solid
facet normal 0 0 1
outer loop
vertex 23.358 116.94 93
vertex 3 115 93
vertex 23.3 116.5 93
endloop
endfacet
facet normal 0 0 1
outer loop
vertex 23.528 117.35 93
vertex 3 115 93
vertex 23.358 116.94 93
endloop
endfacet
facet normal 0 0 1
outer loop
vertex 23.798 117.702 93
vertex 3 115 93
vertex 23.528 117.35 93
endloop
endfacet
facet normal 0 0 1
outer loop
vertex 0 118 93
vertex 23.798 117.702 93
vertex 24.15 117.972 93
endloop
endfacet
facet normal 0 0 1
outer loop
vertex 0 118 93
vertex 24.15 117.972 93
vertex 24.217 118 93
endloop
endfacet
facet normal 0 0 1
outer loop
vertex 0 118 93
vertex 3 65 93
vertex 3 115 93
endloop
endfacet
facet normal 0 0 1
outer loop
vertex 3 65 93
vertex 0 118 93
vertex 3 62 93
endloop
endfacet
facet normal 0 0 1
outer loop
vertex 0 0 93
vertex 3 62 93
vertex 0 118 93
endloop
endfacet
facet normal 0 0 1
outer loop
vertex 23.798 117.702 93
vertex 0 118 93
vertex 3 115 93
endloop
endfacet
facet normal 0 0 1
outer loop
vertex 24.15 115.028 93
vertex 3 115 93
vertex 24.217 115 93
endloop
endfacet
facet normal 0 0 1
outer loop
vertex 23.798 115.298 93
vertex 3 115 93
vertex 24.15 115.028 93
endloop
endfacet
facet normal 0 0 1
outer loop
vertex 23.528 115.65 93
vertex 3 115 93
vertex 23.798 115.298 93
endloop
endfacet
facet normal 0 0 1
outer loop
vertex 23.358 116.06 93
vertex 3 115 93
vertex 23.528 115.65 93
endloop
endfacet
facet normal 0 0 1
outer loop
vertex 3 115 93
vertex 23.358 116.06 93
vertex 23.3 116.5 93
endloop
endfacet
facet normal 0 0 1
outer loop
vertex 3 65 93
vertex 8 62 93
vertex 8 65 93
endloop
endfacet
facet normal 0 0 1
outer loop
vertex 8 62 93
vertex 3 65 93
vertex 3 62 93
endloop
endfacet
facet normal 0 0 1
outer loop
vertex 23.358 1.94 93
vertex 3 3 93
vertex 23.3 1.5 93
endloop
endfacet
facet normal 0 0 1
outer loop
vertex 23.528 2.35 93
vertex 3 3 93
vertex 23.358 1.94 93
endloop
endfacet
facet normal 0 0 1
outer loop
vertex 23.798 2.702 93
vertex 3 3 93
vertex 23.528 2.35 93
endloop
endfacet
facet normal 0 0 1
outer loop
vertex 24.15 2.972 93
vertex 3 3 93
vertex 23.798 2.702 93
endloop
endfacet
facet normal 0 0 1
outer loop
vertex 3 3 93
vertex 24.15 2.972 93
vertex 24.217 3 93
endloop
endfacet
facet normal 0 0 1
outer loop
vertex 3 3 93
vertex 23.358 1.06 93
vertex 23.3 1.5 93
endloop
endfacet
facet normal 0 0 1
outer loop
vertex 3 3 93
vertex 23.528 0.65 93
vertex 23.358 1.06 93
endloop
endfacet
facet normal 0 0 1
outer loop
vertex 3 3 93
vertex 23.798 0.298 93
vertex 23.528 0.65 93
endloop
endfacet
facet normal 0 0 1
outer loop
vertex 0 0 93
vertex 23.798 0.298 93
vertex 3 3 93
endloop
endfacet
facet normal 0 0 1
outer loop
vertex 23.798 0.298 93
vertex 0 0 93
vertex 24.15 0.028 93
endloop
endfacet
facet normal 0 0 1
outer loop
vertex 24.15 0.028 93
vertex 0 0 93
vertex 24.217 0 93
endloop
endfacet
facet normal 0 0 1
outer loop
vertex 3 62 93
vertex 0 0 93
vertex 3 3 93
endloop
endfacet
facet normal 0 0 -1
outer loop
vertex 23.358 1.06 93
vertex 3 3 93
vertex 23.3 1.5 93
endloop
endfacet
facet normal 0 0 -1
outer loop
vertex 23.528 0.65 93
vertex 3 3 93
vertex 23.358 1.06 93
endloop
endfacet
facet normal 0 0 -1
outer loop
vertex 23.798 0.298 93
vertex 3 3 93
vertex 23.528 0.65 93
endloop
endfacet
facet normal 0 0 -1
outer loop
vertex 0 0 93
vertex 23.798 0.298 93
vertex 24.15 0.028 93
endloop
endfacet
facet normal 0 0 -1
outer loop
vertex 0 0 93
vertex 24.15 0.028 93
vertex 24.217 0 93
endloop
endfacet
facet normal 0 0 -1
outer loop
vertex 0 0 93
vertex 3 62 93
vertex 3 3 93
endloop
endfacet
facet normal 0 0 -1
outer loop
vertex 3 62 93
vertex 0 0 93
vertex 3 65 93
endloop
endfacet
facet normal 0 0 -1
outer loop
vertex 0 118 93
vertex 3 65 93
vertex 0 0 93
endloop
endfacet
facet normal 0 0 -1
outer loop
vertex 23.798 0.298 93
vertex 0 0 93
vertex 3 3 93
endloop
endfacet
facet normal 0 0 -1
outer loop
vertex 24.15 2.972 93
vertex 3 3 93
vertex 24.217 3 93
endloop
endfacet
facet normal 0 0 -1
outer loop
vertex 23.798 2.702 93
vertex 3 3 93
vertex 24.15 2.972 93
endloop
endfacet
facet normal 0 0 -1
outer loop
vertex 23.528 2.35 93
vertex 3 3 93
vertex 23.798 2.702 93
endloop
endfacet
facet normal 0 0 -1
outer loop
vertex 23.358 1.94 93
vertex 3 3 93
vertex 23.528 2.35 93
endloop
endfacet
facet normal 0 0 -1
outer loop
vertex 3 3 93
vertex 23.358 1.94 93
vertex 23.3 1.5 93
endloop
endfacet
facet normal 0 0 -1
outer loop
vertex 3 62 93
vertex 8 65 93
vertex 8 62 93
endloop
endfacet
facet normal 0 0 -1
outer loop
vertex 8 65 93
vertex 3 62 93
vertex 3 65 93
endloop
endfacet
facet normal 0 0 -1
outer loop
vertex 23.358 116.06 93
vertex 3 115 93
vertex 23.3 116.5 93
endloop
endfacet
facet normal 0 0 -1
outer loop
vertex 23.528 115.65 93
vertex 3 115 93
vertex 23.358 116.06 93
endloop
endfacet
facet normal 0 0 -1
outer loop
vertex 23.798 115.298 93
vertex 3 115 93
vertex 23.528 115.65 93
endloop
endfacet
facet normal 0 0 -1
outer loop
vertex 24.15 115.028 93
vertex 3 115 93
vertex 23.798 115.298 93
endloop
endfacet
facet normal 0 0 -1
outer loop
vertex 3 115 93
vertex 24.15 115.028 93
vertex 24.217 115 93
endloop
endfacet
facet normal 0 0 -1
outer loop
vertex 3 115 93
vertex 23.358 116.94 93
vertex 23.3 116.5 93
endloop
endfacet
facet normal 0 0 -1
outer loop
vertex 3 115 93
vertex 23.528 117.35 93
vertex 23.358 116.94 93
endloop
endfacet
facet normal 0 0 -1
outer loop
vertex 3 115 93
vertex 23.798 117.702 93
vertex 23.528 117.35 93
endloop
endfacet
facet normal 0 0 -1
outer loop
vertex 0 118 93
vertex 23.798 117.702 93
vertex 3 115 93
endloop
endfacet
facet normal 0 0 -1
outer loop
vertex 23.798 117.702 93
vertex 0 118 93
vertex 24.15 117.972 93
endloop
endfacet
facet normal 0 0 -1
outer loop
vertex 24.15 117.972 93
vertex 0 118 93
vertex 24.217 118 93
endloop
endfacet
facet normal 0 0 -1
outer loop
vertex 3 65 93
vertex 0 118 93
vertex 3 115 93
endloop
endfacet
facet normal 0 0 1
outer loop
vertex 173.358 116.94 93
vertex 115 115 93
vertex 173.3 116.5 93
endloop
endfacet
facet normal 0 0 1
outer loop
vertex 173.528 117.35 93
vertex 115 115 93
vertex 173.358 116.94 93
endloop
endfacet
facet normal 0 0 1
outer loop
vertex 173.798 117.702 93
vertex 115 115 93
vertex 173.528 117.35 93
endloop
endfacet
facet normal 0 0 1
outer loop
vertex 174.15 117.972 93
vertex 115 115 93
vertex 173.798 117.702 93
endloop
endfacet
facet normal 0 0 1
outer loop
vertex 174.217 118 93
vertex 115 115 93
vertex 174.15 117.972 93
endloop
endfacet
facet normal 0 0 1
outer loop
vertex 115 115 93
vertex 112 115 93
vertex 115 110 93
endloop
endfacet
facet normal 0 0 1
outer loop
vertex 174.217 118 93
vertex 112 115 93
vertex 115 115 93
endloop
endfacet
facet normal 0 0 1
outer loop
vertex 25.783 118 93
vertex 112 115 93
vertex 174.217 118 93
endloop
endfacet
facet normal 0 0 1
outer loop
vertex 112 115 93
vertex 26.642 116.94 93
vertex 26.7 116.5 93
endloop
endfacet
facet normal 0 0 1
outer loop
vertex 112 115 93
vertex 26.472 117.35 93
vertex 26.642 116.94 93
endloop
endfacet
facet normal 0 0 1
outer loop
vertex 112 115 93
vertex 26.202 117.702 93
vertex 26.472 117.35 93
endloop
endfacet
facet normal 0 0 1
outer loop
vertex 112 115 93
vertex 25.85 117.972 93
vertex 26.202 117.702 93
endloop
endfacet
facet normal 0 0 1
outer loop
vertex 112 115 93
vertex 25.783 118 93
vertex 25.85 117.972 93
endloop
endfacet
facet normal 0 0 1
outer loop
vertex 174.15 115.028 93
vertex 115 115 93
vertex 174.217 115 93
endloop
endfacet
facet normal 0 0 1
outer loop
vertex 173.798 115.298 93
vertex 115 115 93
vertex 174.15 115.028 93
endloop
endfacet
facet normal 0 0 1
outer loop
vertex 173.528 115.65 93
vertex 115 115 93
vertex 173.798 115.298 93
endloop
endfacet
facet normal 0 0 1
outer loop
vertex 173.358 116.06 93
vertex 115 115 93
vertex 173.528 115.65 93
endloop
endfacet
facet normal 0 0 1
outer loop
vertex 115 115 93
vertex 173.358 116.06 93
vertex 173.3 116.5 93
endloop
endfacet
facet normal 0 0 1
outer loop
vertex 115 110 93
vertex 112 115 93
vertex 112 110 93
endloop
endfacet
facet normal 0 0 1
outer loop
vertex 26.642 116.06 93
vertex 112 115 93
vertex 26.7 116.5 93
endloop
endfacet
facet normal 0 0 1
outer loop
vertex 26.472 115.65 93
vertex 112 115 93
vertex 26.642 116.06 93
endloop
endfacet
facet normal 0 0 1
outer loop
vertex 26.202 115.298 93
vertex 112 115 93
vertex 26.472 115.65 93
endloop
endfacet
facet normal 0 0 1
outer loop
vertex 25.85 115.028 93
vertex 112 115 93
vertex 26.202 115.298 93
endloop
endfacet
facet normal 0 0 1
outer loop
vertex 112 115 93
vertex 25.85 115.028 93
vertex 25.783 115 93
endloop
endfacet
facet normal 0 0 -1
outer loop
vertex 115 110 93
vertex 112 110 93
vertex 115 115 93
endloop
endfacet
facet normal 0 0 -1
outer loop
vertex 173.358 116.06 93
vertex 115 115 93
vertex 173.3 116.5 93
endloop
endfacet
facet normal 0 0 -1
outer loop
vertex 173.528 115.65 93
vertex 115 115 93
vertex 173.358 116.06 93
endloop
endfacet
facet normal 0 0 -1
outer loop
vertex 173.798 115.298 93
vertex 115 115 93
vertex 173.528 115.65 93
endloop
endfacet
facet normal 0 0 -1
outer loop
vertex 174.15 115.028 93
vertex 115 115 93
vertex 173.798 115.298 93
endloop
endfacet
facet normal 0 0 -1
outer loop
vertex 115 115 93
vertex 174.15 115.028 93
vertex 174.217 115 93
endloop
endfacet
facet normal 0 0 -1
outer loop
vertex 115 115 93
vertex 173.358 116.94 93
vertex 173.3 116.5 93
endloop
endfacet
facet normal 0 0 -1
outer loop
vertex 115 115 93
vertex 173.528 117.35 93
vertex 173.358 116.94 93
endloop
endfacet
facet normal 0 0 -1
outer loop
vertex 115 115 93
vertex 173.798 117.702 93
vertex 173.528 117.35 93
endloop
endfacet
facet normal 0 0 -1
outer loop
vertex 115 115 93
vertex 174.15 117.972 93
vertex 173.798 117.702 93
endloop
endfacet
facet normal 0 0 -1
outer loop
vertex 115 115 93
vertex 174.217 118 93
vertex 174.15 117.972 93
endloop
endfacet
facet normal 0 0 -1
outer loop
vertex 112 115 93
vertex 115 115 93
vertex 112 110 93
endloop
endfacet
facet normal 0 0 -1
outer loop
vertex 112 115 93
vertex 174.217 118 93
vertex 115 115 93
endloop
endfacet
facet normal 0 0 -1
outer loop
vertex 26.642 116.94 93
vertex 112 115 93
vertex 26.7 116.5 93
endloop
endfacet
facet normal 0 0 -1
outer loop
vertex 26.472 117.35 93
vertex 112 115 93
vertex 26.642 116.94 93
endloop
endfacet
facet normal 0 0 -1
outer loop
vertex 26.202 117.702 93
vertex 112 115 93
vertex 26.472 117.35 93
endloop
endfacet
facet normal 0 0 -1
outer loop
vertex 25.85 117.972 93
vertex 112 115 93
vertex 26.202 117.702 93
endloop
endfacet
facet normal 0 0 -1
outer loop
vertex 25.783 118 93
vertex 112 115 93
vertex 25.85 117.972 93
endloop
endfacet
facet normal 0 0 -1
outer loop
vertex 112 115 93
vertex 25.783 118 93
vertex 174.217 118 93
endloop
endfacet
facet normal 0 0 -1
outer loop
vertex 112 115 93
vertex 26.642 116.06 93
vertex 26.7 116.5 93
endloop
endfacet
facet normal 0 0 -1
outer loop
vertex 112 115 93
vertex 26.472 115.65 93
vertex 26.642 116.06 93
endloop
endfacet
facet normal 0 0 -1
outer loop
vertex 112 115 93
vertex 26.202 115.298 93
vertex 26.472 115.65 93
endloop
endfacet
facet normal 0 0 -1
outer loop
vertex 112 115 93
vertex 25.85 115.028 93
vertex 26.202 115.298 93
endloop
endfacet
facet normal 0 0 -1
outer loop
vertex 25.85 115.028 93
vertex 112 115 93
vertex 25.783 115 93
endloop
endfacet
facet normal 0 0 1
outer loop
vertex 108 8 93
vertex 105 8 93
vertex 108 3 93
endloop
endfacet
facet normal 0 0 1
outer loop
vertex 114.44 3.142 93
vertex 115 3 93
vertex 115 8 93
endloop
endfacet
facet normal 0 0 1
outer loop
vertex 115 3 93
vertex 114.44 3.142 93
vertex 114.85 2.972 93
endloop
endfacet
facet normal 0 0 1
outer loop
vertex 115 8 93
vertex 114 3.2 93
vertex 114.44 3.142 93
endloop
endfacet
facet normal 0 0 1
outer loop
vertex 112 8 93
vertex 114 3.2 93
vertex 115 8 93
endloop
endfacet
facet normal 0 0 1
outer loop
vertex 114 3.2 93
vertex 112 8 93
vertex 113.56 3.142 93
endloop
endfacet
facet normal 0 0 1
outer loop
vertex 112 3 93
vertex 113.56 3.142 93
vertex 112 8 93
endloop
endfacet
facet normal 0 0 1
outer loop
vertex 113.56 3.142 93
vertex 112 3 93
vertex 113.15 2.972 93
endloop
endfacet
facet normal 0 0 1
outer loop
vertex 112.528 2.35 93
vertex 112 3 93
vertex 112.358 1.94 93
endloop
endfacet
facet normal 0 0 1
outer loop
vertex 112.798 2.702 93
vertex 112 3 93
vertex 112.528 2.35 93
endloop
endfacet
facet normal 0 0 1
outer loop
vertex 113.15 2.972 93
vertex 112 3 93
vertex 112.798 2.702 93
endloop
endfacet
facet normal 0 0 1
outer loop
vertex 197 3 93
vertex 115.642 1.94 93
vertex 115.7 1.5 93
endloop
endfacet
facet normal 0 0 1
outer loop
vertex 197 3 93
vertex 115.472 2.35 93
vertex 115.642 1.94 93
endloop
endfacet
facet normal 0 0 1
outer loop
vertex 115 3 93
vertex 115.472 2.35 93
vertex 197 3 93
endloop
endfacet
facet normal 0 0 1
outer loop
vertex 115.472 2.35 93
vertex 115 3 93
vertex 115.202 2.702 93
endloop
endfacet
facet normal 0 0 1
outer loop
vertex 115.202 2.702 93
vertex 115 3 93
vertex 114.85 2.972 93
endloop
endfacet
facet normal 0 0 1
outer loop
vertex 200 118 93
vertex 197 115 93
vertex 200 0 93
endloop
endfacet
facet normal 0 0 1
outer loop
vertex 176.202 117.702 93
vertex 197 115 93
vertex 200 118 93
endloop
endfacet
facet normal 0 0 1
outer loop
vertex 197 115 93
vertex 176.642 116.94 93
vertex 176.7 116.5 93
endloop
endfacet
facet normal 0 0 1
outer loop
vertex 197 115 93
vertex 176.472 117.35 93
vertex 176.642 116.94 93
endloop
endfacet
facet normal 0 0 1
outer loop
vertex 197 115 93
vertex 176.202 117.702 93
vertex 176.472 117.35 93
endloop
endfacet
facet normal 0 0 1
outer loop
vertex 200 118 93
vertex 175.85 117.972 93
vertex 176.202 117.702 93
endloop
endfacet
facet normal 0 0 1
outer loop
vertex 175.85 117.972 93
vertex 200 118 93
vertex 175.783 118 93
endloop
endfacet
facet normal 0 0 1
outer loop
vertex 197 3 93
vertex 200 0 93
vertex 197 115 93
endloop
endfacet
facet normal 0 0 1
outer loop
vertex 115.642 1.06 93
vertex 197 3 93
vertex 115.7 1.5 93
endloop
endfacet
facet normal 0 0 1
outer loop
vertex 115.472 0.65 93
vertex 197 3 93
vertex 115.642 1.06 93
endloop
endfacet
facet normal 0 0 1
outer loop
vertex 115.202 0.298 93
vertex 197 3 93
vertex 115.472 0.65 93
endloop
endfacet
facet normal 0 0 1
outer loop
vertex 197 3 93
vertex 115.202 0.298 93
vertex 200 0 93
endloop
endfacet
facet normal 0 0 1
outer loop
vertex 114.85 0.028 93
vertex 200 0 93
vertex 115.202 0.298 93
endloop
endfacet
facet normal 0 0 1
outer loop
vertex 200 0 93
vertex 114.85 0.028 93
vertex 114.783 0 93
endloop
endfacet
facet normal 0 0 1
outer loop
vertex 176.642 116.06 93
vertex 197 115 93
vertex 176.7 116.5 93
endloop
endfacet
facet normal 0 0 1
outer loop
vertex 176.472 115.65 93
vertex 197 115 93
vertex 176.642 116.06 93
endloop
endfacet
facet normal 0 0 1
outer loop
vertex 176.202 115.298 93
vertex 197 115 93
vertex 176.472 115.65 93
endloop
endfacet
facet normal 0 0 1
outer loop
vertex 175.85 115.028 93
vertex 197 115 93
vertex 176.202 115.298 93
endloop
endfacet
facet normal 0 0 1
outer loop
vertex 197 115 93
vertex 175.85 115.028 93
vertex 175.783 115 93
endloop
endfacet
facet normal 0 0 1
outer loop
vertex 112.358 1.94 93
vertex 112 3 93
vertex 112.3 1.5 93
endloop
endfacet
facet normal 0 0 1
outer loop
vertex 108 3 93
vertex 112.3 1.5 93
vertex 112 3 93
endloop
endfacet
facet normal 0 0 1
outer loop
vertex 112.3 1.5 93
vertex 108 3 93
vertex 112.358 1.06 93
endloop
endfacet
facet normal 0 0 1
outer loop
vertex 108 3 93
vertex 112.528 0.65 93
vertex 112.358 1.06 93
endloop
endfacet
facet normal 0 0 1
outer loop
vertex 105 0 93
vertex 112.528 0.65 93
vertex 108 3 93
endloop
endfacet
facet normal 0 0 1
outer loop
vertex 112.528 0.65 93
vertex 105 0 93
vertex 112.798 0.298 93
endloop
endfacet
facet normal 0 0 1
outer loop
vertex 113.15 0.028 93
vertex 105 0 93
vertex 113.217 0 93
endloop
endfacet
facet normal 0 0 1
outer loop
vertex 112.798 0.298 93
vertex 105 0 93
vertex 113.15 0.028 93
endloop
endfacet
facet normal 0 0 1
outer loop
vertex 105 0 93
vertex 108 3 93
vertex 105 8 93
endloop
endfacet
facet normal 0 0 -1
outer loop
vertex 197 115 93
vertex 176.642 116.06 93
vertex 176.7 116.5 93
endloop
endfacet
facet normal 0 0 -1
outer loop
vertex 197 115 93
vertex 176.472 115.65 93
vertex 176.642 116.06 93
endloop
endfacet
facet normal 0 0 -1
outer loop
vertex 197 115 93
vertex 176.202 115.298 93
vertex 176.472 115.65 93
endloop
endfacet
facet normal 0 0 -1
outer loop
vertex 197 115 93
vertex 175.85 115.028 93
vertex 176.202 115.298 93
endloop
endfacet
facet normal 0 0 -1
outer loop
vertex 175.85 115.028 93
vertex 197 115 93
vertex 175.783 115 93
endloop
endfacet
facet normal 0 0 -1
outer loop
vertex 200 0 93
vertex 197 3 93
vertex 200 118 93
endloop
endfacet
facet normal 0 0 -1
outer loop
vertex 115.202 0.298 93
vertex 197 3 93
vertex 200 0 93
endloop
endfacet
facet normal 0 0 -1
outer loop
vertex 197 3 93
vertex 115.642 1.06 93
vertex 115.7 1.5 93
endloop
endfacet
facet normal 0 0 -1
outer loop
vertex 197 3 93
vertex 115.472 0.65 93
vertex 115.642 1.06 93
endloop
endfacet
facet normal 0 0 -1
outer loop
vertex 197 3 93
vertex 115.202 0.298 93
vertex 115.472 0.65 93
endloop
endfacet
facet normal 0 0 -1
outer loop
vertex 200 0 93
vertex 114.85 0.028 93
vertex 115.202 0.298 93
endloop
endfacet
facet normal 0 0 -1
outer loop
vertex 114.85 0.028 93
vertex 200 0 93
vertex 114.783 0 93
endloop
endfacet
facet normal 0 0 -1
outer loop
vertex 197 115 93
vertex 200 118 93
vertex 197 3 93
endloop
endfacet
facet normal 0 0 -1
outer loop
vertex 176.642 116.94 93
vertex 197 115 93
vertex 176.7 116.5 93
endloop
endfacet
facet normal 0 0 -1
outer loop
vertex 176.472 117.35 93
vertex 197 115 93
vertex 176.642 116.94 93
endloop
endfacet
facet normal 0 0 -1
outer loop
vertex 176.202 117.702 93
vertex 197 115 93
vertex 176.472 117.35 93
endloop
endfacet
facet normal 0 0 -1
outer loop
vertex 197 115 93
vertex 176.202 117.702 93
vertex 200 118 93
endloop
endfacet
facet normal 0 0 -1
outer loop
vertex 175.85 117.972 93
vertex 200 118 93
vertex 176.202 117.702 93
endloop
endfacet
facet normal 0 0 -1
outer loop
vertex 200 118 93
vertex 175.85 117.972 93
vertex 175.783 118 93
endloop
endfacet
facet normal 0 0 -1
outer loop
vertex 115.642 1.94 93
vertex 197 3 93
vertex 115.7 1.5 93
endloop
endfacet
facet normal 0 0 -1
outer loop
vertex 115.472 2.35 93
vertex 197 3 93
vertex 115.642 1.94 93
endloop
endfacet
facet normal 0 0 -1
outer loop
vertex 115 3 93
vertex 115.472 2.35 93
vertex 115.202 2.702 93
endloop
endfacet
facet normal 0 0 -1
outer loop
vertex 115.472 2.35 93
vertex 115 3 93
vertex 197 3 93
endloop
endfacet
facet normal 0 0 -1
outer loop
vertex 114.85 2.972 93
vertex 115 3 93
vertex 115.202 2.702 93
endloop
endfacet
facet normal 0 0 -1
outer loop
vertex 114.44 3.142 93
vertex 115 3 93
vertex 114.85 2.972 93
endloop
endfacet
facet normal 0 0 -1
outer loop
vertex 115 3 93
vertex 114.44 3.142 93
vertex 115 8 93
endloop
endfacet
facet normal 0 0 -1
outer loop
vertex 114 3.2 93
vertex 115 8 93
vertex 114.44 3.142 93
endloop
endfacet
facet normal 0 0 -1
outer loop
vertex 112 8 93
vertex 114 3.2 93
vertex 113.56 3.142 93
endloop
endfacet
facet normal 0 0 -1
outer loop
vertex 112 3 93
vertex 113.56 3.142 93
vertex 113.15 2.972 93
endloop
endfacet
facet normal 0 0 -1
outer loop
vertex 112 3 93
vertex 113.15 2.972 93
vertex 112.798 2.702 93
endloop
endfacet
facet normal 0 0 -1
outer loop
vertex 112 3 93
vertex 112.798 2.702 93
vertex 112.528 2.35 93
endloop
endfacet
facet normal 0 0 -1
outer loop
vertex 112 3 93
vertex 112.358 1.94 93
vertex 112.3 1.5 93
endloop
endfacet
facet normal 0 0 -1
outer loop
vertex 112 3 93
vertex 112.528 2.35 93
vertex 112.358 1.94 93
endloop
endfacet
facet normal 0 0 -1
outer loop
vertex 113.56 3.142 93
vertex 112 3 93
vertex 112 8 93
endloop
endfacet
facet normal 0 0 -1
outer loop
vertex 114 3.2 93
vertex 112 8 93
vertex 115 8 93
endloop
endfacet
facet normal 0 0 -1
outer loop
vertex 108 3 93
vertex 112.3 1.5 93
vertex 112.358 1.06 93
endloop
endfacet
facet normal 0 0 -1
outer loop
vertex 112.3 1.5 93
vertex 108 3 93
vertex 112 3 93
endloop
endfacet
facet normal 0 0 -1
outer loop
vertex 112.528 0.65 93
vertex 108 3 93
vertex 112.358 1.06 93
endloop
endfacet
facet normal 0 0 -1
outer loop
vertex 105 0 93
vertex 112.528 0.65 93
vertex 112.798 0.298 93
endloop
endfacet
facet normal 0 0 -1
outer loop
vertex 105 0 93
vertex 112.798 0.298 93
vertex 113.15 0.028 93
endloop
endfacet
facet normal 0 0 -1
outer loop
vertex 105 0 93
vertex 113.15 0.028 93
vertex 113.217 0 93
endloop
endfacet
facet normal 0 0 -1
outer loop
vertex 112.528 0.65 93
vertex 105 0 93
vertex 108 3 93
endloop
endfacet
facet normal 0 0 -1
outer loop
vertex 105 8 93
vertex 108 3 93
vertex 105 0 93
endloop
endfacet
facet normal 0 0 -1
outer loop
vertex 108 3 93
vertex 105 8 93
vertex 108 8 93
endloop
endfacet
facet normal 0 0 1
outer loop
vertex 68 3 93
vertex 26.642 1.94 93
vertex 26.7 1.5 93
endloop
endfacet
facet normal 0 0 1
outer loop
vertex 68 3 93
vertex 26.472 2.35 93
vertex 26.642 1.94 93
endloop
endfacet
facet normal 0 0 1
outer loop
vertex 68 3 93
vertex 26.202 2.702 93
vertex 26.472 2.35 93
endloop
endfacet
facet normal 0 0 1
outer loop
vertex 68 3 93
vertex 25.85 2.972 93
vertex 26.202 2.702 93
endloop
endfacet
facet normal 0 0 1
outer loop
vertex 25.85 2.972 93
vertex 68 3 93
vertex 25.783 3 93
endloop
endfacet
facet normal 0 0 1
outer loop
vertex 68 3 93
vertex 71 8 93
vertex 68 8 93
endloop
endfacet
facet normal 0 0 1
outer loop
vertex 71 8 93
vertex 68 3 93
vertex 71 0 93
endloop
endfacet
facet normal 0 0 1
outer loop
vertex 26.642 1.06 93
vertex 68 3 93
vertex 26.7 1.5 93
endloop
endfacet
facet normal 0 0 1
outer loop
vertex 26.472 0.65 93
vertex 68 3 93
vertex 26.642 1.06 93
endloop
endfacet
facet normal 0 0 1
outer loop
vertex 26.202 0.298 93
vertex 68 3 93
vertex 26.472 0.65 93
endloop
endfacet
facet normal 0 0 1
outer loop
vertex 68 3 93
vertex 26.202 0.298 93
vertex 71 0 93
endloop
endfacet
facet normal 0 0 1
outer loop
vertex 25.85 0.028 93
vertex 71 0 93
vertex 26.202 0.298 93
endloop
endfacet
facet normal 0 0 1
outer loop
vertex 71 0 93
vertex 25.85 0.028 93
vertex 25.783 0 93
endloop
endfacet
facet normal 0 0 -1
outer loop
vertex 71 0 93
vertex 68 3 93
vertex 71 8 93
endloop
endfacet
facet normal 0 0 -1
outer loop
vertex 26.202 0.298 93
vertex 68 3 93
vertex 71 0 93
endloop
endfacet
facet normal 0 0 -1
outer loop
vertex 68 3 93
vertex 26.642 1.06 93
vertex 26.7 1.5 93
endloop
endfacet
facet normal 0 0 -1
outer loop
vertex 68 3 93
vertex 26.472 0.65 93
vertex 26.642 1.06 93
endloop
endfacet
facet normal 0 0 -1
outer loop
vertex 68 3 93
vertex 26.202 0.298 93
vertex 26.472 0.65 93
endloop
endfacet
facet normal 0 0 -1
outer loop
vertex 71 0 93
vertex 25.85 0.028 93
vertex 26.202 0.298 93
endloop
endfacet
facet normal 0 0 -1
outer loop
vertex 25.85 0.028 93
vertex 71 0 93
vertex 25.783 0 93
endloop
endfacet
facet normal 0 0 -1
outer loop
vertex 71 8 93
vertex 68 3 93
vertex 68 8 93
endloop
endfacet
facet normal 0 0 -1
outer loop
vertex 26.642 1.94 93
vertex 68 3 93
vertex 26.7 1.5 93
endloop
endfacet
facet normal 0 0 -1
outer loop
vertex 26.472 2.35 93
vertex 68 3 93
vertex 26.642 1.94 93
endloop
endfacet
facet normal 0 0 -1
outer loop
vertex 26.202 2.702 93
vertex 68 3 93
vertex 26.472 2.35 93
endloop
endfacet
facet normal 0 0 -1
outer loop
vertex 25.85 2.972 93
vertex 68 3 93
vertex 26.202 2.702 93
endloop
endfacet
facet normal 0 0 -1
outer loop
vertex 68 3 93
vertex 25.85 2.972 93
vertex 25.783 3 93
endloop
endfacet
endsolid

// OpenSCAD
// Diagnostic only - not a terrain part.
// Checks that moving parts do not interfere with the body.
// An EMPTY result means the parts only touch (zero shared volume) = good fit.
// A non-empty result is real interference and the part will not move.
//
// test = 0 : roof seated on the walls   (lip must drop in without jamming)
// test = 1 : front door swinging        (sweep vs body)
// test = 2 : back door swinging
// test = 3 : garage door tilting up
// Run: openscad --render -o _ft.stl -D test=N -D ang=NN _fit_test.scad

include <ranch_house.scad>

render_top = false;
test = 0;
ang  = 0;

if (test == 0)
    intersection() {
        house_body();
        translate([0, 0, wtop]) roof();
    }
else if (test == 1)
    intersection() {
        house_body();
        translate([fd_tx, fd_y, ftop]) rotate([0, 0, ang]) swing_door();
    }
else if (test == 2)
    intersection() {
        house_body();
        translate([bd_tx, bd_y, ftop]) rotate([0, 0, 180 - ang]) swing_door();
    }
else
    intersection() {
        house_body();
        translate([gar_op_x0 + 0.5, wall_t/2, ftop + gar_op_h - gar_tube_d/2])
            rotate([ang, 0, 0]) garage_door();
    }
